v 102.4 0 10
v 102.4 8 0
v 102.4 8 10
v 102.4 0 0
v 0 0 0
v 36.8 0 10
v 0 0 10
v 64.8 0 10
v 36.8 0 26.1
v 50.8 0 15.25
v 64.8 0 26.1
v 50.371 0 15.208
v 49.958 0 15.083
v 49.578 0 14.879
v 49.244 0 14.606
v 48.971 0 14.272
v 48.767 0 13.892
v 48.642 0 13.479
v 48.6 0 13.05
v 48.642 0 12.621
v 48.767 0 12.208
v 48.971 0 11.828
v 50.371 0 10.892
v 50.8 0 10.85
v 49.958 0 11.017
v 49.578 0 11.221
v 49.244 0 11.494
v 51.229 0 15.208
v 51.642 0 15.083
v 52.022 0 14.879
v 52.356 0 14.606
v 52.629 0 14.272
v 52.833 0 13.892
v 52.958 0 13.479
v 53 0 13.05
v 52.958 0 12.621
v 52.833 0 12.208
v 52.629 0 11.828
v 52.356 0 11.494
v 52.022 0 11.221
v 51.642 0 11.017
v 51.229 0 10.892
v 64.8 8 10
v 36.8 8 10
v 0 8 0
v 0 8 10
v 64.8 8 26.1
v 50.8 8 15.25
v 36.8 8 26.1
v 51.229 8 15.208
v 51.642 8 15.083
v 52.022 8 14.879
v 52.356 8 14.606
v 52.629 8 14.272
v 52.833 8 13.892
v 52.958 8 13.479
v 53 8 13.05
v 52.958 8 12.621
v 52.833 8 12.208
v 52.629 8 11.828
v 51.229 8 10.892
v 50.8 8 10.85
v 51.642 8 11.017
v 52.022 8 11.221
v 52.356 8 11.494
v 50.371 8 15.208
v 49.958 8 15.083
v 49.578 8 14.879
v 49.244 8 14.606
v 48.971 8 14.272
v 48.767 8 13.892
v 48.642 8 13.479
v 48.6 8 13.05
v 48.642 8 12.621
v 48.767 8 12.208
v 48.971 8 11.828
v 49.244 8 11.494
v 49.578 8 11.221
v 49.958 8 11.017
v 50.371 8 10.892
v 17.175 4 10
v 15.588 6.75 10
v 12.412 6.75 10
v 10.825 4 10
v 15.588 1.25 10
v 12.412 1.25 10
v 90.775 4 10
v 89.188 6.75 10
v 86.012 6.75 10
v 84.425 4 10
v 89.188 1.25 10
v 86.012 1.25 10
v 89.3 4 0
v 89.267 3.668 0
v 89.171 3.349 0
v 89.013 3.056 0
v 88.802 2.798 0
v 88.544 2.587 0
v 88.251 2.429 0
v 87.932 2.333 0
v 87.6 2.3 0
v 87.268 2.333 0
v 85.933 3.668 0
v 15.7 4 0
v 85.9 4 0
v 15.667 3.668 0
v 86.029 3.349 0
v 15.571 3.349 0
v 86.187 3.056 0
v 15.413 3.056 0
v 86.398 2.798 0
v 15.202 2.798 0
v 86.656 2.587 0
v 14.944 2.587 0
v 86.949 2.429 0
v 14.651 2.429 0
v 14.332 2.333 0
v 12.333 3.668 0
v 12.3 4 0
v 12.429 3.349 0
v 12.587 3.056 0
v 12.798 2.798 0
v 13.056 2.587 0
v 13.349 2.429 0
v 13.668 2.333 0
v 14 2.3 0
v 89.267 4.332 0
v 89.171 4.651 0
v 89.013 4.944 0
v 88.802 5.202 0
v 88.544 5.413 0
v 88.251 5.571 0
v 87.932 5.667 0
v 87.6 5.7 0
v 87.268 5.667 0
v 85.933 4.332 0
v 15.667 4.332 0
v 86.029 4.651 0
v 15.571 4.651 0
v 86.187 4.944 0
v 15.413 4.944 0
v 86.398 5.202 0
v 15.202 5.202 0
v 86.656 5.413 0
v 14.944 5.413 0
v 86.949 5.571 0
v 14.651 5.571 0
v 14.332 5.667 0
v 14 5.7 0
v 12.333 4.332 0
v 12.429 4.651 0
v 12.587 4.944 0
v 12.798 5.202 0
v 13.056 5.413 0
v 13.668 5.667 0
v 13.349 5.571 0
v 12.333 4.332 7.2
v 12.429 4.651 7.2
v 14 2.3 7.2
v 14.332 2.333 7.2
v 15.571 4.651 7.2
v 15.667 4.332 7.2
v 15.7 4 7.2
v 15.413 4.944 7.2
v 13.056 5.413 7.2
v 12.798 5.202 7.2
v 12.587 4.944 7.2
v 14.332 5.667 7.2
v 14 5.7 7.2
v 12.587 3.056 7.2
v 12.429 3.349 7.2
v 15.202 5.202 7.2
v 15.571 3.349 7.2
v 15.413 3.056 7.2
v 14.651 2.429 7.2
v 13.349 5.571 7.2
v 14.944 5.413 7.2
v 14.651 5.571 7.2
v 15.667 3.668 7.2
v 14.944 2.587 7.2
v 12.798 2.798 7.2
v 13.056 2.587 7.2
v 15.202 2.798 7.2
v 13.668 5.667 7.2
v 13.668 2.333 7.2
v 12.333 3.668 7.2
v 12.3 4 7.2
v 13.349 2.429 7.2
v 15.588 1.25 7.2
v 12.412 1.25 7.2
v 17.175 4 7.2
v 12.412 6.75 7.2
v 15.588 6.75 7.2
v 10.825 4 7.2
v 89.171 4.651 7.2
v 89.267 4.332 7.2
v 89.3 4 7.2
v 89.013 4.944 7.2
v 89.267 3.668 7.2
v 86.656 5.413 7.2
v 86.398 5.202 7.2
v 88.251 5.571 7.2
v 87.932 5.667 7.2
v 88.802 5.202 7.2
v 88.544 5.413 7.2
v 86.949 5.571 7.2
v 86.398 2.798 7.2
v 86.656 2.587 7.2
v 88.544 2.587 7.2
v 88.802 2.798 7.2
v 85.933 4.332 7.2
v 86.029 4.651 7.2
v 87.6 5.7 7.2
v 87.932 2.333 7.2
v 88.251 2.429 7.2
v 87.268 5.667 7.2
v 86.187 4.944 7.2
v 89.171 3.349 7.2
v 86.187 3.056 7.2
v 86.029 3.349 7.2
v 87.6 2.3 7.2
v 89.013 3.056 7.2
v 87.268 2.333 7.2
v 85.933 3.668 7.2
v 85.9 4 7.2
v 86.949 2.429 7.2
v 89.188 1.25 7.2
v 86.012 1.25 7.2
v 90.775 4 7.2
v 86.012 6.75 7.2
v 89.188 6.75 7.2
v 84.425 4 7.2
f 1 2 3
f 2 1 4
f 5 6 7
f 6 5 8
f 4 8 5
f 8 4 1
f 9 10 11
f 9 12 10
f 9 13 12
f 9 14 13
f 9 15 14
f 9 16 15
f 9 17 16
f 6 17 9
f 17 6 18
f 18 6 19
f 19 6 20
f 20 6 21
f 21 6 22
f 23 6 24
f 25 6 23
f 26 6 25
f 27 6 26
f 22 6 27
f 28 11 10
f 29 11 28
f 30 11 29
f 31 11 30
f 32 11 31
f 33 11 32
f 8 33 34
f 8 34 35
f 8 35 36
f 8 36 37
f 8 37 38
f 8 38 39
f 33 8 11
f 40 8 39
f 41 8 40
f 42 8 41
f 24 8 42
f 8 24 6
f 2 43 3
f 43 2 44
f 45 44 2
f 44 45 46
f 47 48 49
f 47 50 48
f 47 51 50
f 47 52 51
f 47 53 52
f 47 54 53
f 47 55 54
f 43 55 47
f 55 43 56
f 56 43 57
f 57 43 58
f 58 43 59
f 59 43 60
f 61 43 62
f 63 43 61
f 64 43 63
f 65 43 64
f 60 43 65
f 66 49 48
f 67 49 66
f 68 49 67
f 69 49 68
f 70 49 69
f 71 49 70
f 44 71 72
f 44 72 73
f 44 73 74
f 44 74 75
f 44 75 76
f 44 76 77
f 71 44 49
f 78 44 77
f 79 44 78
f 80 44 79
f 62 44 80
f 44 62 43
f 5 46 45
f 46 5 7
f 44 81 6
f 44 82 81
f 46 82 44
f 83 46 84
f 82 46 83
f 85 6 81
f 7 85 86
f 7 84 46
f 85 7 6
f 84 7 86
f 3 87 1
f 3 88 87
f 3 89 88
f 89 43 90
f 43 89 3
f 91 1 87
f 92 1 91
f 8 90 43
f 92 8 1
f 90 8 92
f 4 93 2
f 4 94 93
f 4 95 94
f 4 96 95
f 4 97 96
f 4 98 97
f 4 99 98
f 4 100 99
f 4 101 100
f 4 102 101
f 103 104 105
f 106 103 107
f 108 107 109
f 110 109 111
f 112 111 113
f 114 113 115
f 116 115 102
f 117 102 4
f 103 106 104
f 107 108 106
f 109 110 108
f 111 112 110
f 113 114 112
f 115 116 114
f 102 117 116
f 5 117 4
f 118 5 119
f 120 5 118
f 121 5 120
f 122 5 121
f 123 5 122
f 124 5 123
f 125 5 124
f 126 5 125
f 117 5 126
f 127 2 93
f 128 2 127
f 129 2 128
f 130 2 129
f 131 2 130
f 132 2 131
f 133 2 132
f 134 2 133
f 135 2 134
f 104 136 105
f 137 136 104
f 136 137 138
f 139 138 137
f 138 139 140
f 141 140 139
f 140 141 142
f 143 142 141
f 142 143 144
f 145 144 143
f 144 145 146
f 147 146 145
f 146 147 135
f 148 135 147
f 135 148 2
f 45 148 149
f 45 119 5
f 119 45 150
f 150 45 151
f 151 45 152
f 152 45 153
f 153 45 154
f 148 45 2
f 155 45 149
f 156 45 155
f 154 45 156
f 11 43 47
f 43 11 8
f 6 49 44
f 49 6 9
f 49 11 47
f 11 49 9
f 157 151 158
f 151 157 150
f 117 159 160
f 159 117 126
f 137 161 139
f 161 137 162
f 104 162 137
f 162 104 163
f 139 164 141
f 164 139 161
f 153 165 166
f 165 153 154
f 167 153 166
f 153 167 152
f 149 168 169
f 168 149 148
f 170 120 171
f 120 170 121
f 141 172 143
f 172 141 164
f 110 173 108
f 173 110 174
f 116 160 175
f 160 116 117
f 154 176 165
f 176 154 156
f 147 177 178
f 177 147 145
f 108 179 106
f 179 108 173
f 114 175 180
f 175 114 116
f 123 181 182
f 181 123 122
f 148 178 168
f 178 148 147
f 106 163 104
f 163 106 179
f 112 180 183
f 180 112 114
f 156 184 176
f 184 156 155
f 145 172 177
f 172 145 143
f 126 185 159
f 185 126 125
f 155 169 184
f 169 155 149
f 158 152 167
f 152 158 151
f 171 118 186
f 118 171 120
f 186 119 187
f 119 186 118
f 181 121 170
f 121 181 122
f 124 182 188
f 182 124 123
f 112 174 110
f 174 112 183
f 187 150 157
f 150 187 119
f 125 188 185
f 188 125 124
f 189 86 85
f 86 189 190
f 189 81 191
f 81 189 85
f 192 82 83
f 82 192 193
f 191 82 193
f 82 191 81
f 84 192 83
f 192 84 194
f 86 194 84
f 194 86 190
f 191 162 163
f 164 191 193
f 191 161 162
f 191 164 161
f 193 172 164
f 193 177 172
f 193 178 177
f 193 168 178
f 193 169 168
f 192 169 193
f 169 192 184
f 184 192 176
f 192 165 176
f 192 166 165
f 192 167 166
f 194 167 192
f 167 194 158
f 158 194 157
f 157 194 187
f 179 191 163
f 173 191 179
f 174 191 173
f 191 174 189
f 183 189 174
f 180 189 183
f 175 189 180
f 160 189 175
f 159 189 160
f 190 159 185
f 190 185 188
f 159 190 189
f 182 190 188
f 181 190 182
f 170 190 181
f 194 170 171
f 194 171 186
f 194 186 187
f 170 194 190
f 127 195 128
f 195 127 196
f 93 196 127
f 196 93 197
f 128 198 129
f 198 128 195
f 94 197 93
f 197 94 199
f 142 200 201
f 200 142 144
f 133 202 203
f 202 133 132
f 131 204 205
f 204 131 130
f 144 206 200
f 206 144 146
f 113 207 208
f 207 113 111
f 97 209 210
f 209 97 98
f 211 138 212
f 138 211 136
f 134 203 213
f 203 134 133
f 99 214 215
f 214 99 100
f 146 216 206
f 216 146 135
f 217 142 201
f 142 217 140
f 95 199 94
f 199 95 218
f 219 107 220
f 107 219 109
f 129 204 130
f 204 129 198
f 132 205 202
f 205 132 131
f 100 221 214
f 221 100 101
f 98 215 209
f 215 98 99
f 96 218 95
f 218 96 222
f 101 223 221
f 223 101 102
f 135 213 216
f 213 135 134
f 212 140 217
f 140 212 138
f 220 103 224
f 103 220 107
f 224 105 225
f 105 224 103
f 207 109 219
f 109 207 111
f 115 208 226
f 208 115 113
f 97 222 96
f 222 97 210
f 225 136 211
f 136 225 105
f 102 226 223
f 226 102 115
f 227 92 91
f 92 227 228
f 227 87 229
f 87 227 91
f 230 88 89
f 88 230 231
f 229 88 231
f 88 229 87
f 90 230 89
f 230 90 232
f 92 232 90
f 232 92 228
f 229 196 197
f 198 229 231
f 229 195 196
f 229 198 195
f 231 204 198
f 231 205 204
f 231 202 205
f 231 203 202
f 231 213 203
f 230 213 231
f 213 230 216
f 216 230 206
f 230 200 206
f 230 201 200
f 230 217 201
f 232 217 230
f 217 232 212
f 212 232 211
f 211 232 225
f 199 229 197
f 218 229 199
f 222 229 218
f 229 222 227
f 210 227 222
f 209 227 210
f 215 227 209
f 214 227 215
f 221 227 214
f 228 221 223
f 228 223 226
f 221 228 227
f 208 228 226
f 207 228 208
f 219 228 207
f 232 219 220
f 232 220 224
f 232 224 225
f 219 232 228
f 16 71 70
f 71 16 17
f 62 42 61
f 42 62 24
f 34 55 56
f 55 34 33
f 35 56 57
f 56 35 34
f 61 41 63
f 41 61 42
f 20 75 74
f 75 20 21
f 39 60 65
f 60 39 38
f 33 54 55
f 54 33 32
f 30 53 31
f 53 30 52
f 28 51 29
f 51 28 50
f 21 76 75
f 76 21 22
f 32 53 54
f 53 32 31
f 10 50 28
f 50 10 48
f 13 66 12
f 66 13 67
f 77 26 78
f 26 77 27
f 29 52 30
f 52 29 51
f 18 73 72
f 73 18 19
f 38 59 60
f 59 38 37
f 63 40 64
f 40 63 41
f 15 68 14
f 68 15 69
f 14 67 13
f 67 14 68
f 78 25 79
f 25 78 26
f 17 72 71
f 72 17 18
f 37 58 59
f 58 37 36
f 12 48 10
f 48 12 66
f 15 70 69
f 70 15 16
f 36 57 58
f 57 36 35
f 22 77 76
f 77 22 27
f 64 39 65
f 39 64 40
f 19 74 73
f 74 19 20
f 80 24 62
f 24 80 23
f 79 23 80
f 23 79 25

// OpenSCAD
// file: params.scad
// Общие размеры первой итерации: один отсек 3.5" и детали вокруг него.
// Корпус диска — SFF-8301, таблица 3-1, класс высоты 26.10 мм (максимум).
// Положение разъёма SATA сюда не зашито: его снимают калибром gauge.scad
// с конкретного диска и только потом переносят в окно салазок.

drive_width = 101.60;
drive_height = 26.10;
drive_length = 147.00;

wall = 4.0;
floor_t = 4.0;
lip_t = 3.0;
nib = 4.0;
side_clearance = 0.8;
top_clearance = 1.5;

front_gap = 3.0;
plate_t = 8.0;
front_extra = front_gap + plate_t;

pusher_d = 4.4;
m3_clear = 3.4;
m3_pilot = 2.6;
m3_nut_af = 5.5;
m3_nut_t = 2.8;

cavity_w = drive_width + side_clearance;
outer_w = cavity_w + 2 * wall;
wall_h = drive_height + top_clearance;
body_z = drive_length + front_extra;

strap_z = 18;
strap_t = 4.0;
strap_foot = 14.0;

plate_screw_x = [14, drive_width - 14];
plate_z0 = drive_length + front_gap;
plate_screw_z = plate_z0 + plate_t / 2;
plate_bar_h = 10;
tower_w = 28;
tower_x = drive_width / 2 - tower_w / 2;

sled_w = 78;
sled_h = 48;
sled_t = 8;
sled_window_w = 50;
sled_window_h = 18;
sled_hole_inset = 6;

$fn = 32;
// file: lib.scad
include <params.scad>

// Цилиндр гайки M3. Ось цилиндра — Z вызывающего модуля.
module m3_nut() {
    cylinder(h = m3_nut_t, d = m3_nut_af / cos(30), $fn = 6);
}
// main file
// Передний упор. Винт M4 вдоль Z поджимает диск к задним уголкам.
// Два винта M3 снизу держат пластину на полу отсека, гайки сверху низкой полки.
// Файл кладёт деталь гайками вверх.

include <lib.scad>

module front_plate_body() {
    difference() {
        union() {
            cube([cavity_w, plate_bar_h, plate_t]);
            translate([tower_x, 0, 0])
                cube([tower_w, drive_height, plate_t]);
        }
        for (x = plate_screw_x) {
            translate([x, -0.1, plate_t / 2])
                rotate([-90, 0, 0])
                    cylinder(h = plate_bar_h + 0.2, d = m3_clear);
            translate([x, plate_bar_h - m3_nut_t, plate_t / 2])
                rotate([-90, 0, 0])
                    m3_nut();
        }
        translate([drive_width / 2, drive_height / 2, -0.1])
            cylinder(h = plate_t + 0.2, d = pusher_d);
    }
}

// +Y корпуса (гайка) становится +Z принтера.
translate([0, plate_t, 0])
    rotate([90, 0, 0])
        front_plate_body();
